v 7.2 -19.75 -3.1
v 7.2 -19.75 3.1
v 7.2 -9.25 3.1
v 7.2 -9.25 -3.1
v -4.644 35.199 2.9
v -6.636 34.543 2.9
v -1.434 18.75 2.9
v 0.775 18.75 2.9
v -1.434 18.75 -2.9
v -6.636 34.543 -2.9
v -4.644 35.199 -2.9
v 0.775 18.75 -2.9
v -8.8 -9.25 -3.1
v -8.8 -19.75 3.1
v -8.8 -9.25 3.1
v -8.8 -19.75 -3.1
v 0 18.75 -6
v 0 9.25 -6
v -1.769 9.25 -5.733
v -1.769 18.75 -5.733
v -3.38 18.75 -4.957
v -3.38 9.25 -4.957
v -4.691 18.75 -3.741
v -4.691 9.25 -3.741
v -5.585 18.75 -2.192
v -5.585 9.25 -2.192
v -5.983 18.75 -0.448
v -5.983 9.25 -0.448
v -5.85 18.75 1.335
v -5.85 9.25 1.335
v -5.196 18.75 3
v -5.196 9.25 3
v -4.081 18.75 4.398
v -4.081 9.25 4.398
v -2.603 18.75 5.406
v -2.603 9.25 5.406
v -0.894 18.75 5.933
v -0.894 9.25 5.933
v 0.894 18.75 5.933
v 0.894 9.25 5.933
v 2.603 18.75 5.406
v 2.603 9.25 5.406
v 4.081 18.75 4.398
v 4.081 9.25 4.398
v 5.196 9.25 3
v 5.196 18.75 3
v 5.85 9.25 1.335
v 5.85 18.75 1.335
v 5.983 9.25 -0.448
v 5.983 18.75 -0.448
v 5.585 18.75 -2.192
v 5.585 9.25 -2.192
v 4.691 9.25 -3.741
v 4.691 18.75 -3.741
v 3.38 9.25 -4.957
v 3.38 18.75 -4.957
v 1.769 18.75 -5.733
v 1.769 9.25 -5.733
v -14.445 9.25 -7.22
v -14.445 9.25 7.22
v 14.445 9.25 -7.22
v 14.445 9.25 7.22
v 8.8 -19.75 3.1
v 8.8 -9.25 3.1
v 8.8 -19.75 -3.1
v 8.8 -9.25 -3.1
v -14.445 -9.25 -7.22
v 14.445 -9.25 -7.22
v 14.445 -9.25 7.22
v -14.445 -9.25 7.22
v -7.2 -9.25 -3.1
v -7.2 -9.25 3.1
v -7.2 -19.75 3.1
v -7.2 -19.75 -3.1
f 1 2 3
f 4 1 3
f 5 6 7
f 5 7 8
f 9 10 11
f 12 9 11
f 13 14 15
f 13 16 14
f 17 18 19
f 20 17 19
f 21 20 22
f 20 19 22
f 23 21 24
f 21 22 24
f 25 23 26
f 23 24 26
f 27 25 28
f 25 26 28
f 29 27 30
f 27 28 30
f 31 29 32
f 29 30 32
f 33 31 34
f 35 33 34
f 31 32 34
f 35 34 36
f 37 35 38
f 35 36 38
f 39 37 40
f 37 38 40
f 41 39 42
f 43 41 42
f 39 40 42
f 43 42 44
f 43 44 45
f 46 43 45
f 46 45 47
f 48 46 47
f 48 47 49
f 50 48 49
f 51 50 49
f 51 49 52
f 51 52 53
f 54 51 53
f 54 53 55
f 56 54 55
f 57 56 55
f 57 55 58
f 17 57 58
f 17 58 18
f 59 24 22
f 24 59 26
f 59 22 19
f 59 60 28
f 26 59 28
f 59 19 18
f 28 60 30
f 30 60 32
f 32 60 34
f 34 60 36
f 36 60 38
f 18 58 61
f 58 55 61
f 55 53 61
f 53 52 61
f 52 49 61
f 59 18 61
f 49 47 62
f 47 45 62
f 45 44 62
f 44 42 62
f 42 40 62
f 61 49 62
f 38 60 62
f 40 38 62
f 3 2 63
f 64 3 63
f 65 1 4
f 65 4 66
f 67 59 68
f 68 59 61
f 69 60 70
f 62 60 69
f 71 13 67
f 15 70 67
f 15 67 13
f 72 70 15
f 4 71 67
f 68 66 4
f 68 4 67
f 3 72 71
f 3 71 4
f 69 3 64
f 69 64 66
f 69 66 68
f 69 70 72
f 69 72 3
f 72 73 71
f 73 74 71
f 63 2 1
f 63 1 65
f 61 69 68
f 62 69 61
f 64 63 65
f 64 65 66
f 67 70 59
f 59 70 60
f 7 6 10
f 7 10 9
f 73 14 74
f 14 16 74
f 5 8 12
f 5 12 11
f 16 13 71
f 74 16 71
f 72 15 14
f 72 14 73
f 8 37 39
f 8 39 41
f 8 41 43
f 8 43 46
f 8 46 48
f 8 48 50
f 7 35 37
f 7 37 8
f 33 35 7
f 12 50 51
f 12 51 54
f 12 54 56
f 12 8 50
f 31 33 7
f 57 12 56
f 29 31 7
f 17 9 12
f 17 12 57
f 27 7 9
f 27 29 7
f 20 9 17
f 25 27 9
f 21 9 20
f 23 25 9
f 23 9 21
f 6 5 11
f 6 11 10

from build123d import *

# Parameters (mm, degrees)
SKETCH1_W           = 28.89
SKETCH1_H           = 18.5
BOSS_EXTRUDE1_DEPTH = 7.22
SKETCH2_R           = 6
BOSS_EXTRUDE2_DEPTH = 18.75
BOSS_EXTRUDE3_DEPTH = 2.9
SKETCH4_W           = 1.6
SKETCH4_H           = 10.5
BOSS_EXTRUDE4_DEPTH = 3.1


with BuildPart() as part:
    # Sketch1 → Boss-Extrude1 (new, symmetric)
    with BuildSketch(Plane.XY):
        Rectangle(SKETCH1_W, SKETCH1_H)
    extrude(amount=BOSS_EXTRUDE1_DEPTH, both=True)

    # Sketch2 → Boss-Extrude2 (add)
    with BuildSketch(Plane(origin=(0, 0, 0), x_dir=(1, 0, 0), z_dir=(0, 1, 0))):
        with Locations(Location((0, 0, 0), (0, 0, 90))):
            Circle(SKETCH2_R)
    extrude(amount=BOSS_EXTRUDE2_DEPTH)

    # Sketch3 → Boss-Extrude3 (add, symmetric)
    with BuildSketch(Plane.XY):
        Polygon((-0.986, 17.391), (0.986, 18.109), (-4.644, 35.199), (-6.636315055, 34.542666837), align=None)
    extrude(amount=BOSS_EXTRUDE3_DEPTH, both=True)

    # Sketch4 → Boss-Extrude4 (add, symmetric)
    with BuildSketch(Plane.XY):
        with Locations((-8, -14.5)):
            Rectangle(SKETCH4_W, SKETCH4_H)
        with Locations((8, -14.5)):
            Rectangle(SKETCH4_W, SKETCH4_H)
    extrude(amount=BOSS_EXTRUDE4_DEPTH, both=True)


solid = part.part
